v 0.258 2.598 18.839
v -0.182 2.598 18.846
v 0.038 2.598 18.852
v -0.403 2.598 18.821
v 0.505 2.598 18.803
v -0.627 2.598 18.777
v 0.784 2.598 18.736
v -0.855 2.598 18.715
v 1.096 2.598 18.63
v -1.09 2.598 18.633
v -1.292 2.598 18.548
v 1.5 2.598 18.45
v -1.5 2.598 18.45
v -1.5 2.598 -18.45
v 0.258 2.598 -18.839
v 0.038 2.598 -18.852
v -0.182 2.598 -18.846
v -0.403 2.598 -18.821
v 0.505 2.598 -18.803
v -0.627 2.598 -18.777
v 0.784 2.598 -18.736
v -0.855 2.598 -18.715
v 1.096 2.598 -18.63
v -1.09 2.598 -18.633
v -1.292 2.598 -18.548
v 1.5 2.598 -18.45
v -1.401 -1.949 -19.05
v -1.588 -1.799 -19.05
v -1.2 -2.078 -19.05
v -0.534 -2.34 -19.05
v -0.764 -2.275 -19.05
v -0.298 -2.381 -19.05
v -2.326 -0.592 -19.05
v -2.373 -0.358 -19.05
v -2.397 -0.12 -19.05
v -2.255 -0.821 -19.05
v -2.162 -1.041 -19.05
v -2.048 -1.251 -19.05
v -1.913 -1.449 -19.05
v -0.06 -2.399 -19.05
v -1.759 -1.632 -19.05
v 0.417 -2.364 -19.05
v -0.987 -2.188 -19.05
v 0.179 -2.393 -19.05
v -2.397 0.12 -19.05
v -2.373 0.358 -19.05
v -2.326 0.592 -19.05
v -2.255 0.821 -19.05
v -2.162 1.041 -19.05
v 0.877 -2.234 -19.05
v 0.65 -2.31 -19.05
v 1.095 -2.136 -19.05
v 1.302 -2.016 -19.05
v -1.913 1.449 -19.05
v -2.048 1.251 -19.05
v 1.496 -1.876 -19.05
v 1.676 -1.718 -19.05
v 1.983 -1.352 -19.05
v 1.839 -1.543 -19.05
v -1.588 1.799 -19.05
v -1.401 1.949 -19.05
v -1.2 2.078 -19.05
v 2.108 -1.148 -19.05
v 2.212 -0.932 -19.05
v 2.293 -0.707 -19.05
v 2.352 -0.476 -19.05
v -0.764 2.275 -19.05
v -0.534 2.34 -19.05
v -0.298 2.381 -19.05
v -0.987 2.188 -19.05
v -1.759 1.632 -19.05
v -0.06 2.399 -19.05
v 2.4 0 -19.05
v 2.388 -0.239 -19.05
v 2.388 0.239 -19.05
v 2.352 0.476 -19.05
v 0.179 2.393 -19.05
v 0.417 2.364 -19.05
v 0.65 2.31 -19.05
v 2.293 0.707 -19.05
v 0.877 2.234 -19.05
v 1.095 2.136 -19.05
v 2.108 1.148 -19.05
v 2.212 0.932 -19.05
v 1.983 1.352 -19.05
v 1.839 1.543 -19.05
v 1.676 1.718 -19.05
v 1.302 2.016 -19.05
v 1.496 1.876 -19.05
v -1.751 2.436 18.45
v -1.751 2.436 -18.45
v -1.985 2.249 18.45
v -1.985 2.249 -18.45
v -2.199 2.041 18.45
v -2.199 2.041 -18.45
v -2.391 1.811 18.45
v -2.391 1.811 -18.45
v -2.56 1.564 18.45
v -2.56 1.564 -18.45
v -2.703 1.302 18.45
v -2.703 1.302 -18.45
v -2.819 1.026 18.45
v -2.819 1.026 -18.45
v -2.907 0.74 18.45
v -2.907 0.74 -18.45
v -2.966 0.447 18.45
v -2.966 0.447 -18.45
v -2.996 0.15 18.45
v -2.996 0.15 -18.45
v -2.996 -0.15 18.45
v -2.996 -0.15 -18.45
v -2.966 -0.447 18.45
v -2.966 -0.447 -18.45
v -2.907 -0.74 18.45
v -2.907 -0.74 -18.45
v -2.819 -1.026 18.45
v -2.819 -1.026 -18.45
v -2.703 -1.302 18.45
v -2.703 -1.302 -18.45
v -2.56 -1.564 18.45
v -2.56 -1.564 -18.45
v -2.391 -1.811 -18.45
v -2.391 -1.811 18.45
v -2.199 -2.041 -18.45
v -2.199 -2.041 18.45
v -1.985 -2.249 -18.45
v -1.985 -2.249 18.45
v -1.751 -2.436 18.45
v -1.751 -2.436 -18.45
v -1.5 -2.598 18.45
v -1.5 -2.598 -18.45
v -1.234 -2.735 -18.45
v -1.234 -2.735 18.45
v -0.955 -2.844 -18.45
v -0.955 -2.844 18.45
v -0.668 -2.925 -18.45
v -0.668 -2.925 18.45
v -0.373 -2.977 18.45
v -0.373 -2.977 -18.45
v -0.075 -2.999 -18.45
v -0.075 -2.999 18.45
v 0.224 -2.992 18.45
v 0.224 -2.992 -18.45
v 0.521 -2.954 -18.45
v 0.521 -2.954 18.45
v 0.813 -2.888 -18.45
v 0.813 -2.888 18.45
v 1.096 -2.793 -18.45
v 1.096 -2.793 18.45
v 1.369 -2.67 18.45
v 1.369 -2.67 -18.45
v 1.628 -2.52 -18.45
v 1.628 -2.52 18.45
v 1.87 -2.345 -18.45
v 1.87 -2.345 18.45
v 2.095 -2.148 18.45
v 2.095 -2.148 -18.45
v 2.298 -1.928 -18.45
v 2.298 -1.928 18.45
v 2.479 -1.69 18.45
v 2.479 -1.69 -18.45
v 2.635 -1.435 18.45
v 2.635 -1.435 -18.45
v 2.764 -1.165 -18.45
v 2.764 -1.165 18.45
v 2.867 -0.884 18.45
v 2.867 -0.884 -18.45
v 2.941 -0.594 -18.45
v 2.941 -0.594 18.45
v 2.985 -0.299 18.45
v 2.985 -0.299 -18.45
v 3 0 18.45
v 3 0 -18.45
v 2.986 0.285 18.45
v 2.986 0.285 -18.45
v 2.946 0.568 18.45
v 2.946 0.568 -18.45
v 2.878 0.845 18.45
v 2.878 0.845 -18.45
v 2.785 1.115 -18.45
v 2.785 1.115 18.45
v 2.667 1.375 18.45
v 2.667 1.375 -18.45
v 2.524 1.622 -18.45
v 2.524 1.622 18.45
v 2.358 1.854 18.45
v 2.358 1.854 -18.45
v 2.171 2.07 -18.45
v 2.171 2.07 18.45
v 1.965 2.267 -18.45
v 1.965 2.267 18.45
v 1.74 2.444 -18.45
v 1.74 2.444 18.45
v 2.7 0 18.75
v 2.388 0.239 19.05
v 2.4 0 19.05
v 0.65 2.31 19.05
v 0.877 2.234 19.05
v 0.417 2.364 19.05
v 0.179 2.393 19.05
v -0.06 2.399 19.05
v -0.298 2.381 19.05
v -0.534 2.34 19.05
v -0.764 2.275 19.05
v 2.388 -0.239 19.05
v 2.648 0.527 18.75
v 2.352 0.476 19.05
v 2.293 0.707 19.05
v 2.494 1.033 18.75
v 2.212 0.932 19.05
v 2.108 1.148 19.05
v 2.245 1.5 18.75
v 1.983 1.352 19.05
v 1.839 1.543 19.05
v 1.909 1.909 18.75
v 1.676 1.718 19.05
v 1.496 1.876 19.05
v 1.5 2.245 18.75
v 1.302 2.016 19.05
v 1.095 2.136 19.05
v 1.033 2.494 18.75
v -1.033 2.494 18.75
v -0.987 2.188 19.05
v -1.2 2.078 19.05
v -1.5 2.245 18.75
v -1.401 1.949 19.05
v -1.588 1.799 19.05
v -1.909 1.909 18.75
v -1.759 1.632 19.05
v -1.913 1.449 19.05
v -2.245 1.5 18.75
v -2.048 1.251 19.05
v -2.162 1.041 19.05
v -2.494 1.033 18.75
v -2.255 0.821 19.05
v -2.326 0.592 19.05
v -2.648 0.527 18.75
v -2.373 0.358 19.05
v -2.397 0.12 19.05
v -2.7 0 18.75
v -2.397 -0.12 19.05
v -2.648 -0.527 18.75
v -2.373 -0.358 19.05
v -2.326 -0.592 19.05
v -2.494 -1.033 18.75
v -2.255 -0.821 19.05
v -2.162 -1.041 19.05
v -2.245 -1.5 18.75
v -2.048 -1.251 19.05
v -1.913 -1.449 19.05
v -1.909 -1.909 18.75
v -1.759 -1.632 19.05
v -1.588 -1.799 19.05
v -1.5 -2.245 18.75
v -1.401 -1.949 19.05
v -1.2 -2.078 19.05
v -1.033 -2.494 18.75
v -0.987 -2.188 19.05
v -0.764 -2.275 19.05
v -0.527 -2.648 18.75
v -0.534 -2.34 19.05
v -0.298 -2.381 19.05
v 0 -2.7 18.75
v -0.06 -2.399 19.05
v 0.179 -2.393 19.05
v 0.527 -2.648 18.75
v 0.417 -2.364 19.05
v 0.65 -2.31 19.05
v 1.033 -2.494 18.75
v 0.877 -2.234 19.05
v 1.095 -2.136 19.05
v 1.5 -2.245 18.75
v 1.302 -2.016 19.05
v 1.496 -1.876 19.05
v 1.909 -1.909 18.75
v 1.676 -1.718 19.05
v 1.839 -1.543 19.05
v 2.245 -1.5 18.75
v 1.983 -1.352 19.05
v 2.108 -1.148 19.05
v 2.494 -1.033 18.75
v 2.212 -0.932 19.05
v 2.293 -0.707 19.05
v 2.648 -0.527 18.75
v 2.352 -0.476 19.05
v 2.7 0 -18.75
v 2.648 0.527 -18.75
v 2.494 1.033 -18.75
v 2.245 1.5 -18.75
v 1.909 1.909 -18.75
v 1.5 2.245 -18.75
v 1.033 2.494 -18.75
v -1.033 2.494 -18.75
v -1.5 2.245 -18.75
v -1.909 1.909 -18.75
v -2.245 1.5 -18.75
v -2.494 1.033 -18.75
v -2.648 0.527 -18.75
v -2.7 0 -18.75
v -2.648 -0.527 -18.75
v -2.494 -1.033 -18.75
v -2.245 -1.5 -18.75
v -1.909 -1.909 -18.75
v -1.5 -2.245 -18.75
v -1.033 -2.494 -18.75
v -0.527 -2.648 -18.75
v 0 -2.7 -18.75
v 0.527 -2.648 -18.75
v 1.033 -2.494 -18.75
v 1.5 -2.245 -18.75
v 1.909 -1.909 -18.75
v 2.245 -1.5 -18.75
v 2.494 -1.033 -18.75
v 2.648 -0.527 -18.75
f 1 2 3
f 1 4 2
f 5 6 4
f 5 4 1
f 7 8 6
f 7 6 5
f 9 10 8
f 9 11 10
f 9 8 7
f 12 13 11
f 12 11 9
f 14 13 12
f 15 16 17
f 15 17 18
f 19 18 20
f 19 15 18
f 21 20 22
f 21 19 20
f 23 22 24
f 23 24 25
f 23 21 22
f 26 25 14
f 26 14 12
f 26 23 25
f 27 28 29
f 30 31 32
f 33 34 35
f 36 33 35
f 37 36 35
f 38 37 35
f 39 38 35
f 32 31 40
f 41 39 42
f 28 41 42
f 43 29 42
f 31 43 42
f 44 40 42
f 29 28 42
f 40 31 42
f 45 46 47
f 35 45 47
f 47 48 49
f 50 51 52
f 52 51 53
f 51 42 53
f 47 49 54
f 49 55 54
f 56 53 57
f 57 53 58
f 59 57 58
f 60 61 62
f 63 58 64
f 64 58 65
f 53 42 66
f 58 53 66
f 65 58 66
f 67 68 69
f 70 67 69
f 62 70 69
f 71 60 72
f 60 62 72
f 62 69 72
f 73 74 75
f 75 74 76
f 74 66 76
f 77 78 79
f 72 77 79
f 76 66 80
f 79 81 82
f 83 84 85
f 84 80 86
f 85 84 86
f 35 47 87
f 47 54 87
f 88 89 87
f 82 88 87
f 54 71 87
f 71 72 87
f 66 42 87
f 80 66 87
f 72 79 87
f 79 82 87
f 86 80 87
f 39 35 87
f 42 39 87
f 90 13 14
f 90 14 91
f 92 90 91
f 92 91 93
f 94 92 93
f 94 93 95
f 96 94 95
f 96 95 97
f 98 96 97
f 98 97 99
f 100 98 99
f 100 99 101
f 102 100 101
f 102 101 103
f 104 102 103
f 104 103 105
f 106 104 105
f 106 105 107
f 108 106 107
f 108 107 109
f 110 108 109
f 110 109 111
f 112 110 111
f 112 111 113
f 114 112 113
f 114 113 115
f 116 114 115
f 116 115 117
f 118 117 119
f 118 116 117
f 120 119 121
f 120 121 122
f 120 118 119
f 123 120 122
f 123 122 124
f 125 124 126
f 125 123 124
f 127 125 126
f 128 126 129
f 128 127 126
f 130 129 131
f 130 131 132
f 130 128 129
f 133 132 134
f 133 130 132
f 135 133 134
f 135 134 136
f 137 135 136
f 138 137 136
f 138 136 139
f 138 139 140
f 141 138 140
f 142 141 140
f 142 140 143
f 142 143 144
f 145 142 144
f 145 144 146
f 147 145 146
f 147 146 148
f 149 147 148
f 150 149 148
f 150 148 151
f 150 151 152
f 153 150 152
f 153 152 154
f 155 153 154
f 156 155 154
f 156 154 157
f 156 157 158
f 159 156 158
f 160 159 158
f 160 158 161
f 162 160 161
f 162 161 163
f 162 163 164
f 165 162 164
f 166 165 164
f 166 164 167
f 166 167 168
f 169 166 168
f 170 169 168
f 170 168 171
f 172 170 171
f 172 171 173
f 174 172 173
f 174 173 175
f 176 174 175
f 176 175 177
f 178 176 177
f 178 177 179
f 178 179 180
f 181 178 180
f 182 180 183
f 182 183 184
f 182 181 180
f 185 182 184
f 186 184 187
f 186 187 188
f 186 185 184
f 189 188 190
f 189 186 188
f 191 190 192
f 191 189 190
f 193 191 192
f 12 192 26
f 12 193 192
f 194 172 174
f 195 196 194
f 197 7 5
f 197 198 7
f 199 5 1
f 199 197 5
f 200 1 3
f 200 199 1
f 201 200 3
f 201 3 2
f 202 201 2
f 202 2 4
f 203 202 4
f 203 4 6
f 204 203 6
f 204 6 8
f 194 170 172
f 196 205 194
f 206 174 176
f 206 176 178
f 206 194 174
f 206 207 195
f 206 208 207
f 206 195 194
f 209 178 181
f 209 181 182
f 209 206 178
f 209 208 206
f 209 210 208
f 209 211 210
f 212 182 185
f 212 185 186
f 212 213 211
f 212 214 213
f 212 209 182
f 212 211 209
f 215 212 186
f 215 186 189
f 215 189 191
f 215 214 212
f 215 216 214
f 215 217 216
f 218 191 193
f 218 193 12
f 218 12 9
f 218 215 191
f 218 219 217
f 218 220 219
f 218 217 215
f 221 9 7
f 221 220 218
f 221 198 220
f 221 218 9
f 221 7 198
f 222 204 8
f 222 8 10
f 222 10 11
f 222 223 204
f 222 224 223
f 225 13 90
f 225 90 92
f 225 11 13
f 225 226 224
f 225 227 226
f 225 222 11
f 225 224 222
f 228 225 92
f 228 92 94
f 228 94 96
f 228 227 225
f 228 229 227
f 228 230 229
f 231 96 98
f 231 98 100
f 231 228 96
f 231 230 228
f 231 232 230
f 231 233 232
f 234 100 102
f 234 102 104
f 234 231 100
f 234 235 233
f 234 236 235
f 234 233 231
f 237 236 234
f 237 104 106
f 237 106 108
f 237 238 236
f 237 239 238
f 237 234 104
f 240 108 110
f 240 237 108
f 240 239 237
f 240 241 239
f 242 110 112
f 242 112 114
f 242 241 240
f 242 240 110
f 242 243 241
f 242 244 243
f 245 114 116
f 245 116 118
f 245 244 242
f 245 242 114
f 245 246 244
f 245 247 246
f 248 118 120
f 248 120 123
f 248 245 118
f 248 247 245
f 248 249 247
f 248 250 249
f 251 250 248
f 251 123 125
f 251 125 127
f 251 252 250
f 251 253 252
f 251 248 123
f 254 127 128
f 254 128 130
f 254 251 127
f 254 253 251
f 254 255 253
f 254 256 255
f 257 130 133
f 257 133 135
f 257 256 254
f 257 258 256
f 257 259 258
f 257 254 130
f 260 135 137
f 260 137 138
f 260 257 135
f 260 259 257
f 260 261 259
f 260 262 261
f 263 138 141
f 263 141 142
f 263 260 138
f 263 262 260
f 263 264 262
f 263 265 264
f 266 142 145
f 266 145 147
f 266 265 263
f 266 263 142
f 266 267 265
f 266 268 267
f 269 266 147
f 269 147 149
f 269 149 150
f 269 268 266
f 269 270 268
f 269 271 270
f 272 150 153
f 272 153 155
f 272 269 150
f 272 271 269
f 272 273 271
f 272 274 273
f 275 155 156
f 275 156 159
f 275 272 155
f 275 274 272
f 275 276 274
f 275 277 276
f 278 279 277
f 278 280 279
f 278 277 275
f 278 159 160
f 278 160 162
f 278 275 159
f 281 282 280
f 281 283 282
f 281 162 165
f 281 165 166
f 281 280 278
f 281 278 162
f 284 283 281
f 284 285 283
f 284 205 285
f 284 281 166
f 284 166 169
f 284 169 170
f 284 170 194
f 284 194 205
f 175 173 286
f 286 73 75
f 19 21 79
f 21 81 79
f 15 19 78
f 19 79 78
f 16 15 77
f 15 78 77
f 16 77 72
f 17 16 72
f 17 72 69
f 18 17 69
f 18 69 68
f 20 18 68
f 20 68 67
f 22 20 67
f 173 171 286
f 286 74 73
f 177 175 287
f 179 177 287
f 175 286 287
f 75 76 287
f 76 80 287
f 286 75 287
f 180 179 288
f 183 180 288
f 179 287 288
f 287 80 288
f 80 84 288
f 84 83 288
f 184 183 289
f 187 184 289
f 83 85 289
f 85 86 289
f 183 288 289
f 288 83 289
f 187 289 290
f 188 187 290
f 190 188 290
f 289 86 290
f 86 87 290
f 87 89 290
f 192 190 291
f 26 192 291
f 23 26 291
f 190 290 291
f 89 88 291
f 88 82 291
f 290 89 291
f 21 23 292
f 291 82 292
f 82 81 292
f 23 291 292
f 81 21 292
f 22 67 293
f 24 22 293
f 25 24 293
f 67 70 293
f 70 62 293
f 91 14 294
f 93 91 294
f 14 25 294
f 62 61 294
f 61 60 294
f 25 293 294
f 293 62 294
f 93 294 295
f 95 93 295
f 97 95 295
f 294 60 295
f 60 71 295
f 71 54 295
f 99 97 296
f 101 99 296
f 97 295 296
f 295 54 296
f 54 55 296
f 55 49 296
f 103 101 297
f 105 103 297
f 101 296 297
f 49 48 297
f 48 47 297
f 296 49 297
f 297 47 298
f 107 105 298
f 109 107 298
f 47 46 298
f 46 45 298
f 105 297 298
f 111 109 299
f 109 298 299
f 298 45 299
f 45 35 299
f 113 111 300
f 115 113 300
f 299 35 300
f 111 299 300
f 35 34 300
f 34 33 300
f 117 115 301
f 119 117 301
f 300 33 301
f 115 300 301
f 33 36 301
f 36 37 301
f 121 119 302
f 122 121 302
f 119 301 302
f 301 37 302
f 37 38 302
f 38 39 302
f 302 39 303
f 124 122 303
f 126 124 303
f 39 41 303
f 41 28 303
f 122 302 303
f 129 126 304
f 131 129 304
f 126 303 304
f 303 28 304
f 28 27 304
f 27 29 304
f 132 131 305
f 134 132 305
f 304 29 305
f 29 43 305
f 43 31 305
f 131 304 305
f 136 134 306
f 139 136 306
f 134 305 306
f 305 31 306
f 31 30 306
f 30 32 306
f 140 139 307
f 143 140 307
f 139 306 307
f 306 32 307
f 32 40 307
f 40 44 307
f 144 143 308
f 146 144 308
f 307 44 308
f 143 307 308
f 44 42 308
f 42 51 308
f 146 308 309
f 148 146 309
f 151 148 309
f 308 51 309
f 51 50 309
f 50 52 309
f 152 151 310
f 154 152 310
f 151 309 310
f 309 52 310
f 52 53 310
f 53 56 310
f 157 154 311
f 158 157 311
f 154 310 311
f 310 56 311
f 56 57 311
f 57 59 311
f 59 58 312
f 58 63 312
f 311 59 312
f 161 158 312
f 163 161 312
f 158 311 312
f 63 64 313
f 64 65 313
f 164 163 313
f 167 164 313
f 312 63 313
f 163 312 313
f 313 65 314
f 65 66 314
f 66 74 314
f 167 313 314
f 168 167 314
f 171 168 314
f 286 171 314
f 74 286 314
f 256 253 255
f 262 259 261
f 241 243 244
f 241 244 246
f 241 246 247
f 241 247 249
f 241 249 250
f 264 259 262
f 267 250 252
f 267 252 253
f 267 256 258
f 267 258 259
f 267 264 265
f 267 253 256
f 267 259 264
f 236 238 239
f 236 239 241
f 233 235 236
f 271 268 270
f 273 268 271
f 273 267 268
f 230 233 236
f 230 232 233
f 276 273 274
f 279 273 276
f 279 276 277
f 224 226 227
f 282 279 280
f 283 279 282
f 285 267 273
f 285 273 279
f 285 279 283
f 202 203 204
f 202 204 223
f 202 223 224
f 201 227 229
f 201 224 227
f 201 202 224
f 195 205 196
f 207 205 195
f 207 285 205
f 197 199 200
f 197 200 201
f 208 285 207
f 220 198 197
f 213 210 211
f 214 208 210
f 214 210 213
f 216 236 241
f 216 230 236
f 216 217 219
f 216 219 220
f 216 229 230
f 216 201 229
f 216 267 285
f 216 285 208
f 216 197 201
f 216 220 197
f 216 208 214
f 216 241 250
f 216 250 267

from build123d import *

# Parameters (mm, degrees)
SKETCH1_R           = 3
EXTRUDE1_DEPTH      = 19.05
CHAMFER1_SIZE       = 0.6
EXTRUDE7_DEPTH      = 20.05
EXTRUDE7_DEPTH_BACK = 20.05


with BuildPart() as part:
    # Sketch1 → Extrude1 (new body, symmetric)
    with BuildSketch(Plane.XY):
        Circle(SKETCH1_R)
    extrude(amount=EXTRUDE1_DEPTH, both=True)

    # Chamfer1
    chamfer1_edges = [part.edges().sort_by_distance(p)[0] for p in [
        (-3, 0, -19.05),
        (-3, 0, 19.05),
    ]]
    chamfer(chamfer1_edges, length=CHAMFER1_SIZE)

    # Sketch13 → Extrude7 (cut, two sides)
    with BuildSketch(Plane.XY) as extrude7_sk:
        with BuildLine():
            Line((-1.5, 2.598076211), (1.5, 2.598076211))
            ThreePointArc((1.5, 2.598076211), (0, 3), (-1.5, 2.598076211))
        make_face()
    extrude(amount=EXTRUDE7_DEPTH, mode=Mode.SUBTRACT)
    extrude(extrude7_sk.sketch, amount=-EXTRUDE7_DEPTH_BACK, mode=Mode.SUBTRACT)


solid = part.part
